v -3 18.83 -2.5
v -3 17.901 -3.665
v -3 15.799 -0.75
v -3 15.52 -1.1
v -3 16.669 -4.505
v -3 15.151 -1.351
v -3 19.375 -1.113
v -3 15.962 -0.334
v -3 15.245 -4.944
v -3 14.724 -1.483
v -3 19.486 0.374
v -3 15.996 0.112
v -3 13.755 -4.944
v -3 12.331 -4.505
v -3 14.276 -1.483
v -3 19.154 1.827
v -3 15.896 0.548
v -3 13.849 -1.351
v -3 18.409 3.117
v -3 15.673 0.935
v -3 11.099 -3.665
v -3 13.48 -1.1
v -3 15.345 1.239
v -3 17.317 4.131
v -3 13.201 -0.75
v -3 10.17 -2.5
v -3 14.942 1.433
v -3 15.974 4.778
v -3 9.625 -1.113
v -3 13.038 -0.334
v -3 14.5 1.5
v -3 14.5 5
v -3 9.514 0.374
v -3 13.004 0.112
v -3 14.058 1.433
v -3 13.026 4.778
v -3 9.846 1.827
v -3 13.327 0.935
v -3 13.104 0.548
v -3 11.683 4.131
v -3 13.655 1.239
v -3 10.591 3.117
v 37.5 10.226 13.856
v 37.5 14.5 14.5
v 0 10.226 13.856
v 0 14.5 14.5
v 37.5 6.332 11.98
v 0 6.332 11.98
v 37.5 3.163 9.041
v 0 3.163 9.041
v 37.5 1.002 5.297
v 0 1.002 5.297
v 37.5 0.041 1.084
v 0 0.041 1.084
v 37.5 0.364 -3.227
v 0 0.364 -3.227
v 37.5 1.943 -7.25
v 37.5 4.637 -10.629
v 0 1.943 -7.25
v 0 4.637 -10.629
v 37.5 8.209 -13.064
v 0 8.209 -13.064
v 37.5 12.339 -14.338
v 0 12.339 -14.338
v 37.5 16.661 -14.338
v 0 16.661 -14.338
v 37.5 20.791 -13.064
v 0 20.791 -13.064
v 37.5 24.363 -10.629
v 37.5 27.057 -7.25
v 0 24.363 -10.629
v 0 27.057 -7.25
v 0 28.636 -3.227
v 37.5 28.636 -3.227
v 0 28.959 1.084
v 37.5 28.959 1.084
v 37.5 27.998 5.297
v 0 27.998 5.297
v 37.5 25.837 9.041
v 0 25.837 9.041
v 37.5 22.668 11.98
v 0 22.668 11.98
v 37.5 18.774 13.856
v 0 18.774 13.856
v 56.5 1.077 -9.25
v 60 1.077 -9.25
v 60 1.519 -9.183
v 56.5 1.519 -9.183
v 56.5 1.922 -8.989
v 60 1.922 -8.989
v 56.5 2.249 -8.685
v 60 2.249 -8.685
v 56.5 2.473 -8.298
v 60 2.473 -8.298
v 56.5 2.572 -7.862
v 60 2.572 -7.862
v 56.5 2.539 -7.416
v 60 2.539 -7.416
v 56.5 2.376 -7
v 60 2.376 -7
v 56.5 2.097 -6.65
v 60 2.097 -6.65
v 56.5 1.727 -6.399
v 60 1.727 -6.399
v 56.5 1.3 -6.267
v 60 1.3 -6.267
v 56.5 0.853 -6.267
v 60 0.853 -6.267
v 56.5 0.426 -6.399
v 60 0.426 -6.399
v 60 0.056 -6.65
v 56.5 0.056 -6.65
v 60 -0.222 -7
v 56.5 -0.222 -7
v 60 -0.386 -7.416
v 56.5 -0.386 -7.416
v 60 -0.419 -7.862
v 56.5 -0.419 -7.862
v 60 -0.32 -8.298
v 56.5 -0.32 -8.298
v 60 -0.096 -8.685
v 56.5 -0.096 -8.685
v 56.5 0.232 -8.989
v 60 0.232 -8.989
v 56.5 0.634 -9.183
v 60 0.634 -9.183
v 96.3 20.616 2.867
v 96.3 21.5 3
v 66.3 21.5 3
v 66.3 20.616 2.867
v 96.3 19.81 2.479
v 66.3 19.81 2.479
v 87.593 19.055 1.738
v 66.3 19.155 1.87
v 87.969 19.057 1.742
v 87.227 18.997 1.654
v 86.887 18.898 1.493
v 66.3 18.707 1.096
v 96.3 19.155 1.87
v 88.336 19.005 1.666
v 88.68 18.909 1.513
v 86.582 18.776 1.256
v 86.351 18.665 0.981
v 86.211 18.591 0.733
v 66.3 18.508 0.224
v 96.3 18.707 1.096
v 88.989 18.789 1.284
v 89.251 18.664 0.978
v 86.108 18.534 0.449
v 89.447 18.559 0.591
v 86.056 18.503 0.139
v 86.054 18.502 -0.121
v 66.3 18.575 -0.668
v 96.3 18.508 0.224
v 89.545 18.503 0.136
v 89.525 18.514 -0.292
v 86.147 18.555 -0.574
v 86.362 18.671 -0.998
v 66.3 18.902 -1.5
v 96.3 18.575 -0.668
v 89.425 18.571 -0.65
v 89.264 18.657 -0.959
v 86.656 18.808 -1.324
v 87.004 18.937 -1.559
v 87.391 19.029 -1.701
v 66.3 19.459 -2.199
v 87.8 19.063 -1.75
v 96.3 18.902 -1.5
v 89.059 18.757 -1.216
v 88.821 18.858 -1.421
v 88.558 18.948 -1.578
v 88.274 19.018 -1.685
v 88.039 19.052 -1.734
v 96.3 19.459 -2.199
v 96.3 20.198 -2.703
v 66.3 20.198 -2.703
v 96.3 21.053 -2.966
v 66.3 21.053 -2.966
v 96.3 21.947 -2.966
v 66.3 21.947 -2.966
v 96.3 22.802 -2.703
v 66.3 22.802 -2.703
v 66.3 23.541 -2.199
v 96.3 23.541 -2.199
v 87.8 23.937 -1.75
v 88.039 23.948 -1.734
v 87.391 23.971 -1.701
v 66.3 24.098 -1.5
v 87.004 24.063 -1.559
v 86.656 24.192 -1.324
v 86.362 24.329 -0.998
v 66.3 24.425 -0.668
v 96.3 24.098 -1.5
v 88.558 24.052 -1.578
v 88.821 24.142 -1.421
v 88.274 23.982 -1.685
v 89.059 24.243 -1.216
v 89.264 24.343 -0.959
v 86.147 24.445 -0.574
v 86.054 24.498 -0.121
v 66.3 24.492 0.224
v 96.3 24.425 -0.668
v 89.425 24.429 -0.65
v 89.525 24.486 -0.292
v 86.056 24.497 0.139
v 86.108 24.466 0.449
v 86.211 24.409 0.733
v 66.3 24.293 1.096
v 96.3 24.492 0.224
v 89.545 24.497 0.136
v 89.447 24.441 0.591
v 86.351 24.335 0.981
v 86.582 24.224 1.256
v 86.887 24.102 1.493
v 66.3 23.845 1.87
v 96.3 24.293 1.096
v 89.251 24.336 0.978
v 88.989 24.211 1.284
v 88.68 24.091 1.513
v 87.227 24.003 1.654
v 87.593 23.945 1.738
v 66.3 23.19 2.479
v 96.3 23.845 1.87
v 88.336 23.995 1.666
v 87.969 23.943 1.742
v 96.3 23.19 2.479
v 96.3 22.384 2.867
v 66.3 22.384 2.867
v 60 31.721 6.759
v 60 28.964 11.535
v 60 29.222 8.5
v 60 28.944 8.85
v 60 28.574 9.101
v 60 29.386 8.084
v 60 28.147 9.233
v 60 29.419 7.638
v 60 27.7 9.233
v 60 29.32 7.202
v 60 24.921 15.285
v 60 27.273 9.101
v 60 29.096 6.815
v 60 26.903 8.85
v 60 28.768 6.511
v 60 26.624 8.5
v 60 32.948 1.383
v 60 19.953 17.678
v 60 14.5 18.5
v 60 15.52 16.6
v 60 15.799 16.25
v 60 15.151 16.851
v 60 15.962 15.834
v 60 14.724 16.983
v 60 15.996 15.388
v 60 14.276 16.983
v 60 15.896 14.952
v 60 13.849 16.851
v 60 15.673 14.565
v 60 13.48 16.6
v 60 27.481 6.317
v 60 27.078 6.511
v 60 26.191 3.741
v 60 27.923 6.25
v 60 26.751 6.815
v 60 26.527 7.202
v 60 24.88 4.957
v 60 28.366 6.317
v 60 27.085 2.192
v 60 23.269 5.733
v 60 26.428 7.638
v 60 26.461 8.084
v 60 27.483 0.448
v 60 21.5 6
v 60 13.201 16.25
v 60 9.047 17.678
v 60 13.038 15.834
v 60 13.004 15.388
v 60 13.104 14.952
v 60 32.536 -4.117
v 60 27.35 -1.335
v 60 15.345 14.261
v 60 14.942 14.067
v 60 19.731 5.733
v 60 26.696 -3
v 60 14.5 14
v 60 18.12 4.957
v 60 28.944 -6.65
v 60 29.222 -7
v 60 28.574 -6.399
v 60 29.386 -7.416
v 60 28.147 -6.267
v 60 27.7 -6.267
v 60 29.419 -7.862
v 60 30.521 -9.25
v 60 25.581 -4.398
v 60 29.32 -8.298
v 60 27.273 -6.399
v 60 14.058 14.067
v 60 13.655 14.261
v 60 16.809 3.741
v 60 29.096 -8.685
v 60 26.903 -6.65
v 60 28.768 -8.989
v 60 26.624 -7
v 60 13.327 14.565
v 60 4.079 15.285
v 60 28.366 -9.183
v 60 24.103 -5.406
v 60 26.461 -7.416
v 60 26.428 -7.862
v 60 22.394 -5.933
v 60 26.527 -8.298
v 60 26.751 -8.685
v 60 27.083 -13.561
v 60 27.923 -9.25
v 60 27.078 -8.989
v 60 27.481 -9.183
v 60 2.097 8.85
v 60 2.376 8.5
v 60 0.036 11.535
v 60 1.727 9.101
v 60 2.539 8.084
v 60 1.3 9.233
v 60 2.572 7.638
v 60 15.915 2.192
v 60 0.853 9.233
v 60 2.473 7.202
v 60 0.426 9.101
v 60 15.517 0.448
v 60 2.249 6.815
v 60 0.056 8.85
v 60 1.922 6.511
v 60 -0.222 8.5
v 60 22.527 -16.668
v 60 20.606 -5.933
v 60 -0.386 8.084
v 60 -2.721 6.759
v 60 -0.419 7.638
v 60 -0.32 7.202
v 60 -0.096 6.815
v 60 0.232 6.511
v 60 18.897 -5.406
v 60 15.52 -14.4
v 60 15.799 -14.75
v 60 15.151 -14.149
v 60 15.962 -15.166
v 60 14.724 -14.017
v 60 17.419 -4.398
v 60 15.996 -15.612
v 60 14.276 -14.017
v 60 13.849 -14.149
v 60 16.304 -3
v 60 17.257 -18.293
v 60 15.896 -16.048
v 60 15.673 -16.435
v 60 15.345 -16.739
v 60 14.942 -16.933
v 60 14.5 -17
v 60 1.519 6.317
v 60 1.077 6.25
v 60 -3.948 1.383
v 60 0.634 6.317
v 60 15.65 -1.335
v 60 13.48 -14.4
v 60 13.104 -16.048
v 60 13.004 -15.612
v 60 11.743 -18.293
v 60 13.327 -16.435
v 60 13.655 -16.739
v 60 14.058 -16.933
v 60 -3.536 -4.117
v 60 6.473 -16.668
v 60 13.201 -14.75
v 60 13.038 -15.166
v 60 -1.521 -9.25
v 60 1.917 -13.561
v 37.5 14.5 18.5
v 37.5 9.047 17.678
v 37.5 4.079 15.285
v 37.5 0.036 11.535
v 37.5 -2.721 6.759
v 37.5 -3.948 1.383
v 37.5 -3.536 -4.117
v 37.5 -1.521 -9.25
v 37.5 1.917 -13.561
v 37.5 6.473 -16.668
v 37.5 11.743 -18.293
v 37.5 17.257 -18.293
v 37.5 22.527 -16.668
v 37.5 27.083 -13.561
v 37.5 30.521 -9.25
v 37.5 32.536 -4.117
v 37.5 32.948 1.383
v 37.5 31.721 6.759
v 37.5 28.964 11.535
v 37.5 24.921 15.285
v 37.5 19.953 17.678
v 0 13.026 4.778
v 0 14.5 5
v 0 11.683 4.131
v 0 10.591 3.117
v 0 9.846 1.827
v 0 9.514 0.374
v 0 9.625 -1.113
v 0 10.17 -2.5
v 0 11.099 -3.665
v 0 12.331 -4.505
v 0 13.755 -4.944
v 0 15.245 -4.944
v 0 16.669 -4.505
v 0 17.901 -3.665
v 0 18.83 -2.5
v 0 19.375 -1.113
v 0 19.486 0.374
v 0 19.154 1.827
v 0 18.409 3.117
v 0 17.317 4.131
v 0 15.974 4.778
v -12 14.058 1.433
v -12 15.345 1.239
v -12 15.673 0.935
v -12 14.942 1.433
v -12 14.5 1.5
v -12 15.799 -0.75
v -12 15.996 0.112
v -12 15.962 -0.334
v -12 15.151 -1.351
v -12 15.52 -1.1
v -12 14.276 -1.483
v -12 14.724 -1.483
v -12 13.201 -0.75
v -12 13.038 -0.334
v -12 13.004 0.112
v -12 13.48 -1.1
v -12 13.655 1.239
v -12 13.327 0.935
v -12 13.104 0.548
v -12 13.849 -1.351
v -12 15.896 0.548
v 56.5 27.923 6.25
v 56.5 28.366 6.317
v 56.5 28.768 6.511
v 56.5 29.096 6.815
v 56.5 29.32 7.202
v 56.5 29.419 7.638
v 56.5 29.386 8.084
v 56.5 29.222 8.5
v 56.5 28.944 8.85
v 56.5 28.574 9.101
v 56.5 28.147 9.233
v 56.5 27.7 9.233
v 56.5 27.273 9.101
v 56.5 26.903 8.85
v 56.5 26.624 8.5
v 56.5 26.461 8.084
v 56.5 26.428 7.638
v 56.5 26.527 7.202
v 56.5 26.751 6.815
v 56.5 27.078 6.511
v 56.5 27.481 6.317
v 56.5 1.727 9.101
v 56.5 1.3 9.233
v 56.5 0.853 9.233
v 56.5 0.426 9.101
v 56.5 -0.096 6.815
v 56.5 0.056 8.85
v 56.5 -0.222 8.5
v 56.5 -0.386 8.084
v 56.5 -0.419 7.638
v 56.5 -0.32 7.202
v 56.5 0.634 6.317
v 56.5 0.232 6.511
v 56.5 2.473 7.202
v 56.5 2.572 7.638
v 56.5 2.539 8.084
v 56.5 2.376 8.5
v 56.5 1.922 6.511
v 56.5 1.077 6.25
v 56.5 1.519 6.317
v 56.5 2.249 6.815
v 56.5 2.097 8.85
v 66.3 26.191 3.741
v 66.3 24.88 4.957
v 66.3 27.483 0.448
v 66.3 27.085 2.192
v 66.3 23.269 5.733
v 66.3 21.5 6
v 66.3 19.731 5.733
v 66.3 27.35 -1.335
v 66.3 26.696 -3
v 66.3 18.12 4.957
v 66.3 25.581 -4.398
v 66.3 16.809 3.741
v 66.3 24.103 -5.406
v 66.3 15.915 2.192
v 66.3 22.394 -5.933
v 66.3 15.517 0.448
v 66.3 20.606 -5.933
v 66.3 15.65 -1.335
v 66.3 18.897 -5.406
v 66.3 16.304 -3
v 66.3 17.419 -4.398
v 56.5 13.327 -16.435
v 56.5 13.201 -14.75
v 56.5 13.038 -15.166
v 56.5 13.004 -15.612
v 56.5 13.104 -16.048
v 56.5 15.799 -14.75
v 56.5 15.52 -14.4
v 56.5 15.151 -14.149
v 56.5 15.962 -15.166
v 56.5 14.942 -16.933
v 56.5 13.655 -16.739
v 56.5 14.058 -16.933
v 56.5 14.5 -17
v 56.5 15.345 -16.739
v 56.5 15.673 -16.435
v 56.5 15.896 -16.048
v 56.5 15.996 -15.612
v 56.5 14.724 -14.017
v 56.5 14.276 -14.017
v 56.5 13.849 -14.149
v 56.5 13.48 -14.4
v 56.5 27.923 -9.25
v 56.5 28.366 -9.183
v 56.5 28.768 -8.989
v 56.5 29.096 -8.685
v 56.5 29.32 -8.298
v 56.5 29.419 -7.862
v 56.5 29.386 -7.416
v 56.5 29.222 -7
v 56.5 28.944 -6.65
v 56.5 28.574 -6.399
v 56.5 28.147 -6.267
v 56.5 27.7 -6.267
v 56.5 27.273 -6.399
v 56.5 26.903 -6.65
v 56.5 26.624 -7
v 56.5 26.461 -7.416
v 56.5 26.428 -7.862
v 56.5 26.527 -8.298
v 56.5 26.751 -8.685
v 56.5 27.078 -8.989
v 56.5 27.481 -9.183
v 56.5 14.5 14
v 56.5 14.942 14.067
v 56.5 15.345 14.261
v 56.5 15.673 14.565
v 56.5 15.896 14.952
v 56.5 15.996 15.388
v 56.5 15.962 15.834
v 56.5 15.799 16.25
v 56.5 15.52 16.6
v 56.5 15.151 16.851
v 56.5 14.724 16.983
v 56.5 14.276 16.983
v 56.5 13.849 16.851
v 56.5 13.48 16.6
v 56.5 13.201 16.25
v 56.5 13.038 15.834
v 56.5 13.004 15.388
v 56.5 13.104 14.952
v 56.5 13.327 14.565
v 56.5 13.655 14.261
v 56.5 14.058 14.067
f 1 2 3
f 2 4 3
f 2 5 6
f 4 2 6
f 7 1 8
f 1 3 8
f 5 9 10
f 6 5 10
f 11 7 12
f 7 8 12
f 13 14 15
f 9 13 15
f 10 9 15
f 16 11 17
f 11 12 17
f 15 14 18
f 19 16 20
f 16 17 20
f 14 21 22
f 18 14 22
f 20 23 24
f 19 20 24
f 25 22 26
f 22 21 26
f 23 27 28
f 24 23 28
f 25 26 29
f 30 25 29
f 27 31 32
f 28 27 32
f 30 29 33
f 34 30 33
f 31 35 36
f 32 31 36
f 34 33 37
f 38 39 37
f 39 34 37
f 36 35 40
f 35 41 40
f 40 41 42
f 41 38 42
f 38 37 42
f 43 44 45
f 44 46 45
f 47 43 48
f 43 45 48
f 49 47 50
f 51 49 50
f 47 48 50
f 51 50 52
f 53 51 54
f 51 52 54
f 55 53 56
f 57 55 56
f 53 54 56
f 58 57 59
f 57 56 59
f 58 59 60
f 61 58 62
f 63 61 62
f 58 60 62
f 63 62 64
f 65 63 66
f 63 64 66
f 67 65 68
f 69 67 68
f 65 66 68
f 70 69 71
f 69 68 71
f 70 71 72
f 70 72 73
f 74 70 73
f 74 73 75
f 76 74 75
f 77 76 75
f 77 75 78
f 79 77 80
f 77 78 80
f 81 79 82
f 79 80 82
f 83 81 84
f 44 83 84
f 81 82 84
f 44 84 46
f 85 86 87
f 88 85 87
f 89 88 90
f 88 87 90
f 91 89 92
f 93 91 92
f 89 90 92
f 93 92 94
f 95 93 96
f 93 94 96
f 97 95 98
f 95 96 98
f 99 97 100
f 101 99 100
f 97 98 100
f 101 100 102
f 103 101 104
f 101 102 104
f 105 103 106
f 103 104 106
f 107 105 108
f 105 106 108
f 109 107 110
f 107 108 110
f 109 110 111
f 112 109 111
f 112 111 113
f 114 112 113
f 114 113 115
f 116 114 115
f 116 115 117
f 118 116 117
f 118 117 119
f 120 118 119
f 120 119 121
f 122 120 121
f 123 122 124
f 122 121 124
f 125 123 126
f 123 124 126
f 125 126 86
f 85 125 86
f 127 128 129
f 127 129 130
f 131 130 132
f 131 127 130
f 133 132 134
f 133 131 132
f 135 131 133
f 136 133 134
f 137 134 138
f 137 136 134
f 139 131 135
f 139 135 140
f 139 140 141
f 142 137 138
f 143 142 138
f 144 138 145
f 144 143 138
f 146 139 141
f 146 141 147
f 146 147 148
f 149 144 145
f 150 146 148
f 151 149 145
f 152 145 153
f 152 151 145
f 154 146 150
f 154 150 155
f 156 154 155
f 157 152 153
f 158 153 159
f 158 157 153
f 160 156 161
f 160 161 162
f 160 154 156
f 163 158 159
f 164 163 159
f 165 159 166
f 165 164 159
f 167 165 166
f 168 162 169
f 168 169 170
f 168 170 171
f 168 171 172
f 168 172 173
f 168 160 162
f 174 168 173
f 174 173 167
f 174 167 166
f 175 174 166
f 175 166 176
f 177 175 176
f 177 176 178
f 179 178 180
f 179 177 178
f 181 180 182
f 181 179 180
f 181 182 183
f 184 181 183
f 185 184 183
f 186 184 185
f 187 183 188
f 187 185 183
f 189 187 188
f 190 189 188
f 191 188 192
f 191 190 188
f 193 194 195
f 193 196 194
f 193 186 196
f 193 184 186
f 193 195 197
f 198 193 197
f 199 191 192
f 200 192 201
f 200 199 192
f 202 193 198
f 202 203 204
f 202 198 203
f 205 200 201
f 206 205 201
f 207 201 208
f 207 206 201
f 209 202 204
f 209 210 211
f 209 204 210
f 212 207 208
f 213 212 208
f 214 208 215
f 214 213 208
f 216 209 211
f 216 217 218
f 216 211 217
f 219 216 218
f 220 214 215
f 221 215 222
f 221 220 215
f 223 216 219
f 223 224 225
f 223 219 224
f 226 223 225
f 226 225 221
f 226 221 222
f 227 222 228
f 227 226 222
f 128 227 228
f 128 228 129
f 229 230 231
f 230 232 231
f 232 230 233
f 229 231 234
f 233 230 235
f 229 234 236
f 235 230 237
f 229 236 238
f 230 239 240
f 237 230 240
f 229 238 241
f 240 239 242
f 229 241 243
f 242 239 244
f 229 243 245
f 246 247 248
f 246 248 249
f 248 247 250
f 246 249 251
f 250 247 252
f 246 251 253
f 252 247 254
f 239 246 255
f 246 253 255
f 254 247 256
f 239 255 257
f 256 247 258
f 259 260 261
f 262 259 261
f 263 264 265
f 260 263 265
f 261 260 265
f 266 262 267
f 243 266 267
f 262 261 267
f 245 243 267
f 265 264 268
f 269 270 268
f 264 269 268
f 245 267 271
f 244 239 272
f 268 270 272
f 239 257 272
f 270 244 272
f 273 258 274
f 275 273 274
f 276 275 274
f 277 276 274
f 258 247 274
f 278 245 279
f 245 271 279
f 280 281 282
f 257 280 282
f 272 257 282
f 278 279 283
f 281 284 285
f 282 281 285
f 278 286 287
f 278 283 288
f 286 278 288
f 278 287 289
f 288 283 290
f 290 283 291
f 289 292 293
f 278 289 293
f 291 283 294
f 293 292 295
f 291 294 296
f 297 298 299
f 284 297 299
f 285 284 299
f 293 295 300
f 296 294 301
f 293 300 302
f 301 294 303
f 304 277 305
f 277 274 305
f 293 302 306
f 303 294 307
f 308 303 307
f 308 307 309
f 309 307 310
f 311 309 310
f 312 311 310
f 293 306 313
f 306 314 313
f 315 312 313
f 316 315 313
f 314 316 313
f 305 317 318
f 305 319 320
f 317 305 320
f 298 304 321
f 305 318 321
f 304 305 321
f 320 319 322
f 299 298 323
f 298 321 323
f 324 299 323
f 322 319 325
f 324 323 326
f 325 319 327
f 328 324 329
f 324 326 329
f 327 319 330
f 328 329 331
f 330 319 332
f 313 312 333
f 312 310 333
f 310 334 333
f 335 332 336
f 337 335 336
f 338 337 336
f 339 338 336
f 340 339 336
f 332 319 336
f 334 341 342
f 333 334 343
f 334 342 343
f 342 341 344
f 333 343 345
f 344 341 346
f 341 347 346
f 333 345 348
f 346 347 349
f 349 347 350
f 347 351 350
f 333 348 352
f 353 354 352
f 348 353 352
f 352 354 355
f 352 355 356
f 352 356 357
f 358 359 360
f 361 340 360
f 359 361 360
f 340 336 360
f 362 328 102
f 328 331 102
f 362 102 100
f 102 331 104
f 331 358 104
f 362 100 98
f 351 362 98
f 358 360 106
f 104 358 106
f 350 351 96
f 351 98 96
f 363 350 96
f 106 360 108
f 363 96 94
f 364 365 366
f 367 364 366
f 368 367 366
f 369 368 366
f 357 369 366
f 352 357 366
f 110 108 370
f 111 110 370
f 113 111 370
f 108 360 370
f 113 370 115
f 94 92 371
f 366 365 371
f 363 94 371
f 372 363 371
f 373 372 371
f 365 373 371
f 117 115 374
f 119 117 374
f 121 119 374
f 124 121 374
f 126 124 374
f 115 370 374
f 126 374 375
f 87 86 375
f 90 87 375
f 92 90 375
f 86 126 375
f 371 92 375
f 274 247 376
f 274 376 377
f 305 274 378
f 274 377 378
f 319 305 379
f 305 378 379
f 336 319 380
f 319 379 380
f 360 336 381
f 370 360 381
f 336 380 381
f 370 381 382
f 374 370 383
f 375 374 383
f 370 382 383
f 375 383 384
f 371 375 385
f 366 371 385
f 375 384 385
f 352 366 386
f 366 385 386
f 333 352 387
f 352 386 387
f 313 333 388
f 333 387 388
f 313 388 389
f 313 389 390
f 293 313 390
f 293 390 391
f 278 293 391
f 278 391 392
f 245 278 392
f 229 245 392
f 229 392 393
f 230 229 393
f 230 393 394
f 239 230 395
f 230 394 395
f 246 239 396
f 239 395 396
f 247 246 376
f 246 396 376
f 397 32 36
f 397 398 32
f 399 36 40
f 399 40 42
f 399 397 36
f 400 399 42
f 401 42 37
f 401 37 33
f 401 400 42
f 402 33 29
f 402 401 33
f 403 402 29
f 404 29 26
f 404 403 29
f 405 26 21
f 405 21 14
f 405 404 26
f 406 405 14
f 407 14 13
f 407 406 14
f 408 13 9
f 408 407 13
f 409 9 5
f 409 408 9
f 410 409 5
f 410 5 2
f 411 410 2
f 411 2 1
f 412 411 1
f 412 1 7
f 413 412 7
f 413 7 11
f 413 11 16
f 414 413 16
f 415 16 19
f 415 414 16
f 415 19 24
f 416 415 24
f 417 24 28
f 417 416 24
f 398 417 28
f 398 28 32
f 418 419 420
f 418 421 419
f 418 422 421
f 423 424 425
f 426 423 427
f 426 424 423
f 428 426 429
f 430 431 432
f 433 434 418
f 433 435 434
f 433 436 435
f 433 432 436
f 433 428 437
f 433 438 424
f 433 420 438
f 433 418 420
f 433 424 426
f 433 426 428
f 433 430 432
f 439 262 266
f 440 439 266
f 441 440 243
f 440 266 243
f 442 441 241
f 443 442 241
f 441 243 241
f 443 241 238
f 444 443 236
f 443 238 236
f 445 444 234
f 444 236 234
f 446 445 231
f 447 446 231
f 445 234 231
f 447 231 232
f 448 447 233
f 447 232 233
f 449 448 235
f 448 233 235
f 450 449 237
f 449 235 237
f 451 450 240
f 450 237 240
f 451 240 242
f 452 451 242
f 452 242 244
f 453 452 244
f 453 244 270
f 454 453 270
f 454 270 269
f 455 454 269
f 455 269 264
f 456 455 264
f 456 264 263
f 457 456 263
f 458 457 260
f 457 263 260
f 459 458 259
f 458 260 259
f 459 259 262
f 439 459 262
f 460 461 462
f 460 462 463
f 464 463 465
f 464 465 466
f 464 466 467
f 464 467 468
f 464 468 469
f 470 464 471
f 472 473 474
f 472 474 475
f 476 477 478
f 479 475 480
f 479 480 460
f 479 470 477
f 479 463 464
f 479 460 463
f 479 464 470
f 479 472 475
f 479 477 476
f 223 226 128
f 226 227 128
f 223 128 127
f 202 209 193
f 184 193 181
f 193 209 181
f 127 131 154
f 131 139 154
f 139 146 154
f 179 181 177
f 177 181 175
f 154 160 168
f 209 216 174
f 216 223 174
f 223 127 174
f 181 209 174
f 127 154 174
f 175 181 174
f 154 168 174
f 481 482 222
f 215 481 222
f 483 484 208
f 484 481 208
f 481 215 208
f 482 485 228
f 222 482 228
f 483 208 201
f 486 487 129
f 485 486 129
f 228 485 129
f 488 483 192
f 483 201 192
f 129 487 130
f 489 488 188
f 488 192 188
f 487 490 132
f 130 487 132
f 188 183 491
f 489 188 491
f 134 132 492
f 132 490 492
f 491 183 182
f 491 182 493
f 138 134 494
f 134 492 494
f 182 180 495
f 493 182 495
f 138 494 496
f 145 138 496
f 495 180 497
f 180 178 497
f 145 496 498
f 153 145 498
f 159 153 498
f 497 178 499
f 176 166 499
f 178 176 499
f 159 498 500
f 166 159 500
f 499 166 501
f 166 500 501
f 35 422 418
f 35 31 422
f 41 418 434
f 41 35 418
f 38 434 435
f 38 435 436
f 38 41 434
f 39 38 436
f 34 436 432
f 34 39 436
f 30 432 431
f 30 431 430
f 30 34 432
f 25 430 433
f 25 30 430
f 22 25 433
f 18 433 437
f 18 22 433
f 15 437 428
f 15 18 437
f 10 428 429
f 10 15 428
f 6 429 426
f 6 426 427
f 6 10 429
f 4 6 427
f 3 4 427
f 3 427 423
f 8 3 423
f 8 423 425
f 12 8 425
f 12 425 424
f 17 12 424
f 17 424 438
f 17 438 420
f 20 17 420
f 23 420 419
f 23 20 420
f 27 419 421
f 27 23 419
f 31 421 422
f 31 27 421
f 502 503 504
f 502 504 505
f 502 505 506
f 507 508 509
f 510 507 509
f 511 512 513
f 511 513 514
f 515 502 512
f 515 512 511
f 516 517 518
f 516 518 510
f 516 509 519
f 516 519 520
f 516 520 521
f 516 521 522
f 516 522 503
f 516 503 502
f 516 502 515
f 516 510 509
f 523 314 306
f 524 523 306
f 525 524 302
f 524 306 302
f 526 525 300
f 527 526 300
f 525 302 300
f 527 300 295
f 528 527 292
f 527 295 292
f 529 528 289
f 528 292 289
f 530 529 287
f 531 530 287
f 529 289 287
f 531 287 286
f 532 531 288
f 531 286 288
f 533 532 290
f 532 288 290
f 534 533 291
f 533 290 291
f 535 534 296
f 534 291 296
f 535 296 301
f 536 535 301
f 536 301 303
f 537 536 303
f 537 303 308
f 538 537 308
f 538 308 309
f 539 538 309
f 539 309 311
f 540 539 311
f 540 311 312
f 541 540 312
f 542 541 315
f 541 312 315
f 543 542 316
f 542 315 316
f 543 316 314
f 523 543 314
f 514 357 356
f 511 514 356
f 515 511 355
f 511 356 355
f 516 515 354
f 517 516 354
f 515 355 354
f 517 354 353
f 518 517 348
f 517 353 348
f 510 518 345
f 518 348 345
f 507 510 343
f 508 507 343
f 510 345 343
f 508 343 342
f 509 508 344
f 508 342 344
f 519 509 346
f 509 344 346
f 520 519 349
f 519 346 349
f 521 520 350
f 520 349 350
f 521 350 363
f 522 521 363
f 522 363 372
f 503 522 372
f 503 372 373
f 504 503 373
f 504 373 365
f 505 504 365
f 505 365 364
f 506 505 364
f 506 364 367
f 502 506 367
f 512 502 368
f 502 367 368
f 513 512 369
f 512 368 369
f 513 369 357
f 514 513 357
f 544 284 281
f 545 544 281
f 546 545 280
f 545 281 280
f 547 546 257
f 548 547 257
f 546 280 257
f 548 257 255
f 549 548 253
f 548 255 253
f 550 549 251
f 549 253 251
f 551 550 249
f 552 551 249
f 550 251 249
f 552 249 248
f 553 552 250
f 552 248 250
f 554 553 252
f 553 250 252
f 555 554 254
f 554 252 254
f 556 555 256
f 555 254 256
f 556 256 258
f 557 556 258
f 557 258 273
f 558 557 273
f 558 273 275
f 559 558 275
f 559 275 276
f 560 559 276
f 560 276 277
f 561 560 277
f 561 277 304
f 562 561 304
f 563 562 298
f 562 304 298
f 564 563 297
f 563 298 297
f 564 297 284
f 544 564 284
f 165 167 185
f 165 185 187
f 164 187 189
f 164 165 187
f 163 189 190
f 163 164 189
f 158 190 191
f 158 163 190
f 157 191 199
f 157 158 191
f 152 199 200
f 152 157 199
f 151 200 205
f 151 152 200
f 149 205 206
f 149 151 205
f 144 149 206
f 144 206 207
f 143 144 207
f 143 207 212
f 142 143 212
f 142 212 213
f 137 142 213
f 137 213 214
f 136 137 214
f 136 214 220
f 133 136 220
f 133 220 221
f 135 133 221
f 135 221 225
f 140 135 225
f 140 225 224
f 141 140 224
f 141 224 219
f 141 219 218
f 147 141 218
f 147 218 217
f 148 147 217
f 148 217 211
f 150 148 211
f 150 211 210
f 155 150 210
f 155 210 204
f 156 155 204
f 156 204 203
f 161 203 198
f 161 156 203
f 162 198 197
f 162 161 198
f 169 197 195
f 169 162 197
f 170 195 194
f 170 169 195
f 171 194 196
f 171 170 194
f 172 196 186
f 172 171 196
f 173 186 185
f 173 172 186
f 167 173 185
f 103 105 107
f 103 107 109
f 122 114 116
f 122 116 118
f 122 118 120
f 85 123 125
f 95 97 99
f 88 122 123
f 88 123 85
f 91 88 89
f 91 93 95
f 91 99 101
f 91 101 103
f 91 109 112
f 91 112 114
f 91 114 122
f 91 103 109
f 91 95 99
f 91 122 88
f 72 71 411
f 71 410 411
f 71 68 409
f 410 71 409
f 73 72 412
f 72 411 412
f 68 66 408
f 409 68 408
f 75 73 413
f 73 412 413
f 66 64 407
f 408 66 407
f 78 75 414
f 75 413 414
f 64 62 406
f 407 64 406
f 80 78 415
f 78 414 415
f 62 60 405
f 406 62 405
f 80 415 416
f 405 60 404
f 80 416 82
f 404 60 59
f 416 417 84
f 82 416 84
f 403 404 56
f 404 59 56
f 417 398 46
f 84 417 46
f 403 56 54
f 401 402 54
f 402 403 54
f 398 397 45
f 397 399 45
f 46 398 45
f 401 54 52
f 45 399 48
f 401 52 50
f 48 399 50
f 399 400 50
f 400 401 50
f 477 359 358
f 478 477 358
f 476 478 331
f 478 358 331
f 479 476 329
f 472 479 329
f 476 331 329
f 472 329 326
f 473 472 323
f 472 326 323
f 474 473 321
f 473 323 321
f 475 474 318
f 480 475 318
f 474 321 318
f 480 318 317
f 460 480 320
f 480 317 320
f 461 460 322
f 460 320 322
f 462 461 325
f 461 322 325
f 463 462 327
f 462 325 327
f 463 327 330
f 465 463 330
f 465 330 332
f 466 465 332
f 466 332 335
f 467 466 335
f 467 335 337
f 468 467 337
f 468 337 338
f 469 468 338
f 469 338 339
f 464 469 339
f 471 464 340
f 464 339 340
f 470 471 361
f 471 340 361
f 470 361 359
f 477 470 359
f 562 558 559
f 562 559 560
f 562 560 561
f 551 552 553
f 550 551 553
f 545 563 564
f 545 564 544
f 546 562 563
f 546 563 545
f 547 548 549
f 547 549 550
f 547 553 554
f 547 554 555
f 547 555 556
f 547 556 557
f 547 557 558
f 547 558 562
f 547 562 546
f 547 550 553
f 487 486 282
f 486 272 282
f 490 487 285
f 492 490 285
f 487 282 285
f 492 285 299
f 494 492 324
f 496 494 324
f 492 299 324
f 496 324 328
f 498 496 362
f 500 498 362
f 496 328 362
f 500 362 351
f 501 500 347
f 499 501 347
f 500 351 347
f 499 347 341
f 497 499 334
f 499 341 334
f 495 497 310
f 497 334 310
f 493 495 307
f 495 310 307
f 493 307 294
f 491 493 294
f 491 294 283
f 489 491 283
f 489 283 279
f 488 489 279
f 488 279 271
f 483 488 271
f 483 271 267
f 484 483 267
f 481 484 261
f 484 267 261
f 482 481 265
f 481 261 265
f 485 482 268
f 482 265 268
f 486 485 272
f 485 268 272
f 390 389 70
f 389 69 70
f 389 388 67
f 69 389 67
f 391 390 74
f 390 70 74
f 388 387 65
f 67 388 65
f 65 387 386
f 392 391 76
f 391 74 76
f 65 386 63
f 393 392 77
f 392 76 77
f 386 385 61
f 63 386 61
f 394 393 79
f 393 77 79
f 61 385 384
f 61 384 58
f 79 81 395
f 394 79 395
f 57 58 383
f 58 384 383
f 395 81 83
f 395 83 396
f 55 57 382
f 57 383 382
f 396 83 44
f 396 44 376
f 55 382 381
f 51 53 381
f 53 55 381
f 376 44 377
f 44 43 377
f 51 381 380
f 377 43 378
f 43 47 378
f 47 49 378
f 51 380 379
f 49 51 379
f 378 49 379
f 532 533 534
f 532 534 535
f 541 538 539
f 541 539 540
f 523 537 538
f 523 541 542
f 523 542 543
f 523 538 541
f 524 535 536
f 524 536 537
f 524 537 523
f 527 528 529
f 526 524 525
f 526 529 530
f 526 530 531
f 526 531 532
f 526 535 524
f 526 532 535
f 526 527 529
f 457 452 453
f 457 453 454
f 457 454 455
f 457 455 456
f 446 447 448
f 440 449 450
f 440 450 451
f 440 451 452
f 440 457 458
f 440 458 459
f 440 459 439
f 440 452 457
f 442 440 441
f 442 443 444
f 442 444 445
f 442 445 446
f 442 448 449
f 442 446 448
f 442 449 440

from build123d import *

# Parameters (mm, degrees)
SKETCH2_W          = 3
SKETCH2_H          = 3.5
SKETCH2_H_2        = 1.5
SKETCH2_W_2        = 9
SKETCH2_6_W        = 30
SKETCH2_6_H        = 3
SKETCH3_R          = 1.5
CUT_EXTRUDE1_DEPTH = 3.5
SKETCH4_R          = 1.75
CUT_EXTRUDE2_DEPTH = 104.464679964


with BuildPart() as part:
    # Sketch2 → Revolve2 (revolve)
    with BuildSketch(Plane.XY, mode=Mode.PRIVATE) as revolve2_sk:
        Polygon((0, 14.5), (37.5, 14.5), (37.5, 29), (0, 29), (0, 19.5), (0, 16), align=None)
        Polygon((37.5, 29), (37.5, 14.5), (60, 14.5), (60, 15.5), (60, 21.5), (60, 27.5), (60, 33), (37.5, 33), align=None)
        with Locations((-1.5, 17.75)):
            Rectangle(SKETCH2_W, SKETCH2_H)
        with Locations((-1.5, 15.25)):
            Rectangle(SKETCH2_W, SKETCH2_H_2)
        with Locations((-7.5, 15.25)):
            Rectangle(SKETCH2_W_2, SKETCH2_H_2)
    revolve(revolve2_sk.sketch.rotate(Axis((-31.266871865, 14.5, 0), (1, 0, 0)), 90), axis=Axis((-31.266871865, 14.5, 0), (1, 0, 0)))

    # Sketch2<6> → Revolve3 (revolve)
    with BuildSketch(Plane.XY, mode=Mode.PRIVATE) as revolve3_sk:
        Polygon((60, 27.5), (60, 21.5), (66.3, 21.5), (66.3, 24.5), (66.3, 27.5), align=None)
        with Locations((81.3, 23)):
            Rectangle(SKETCH2_6_W, SKETCH2_6_H)
    revolve(revolve3_sk.sketch.rotate(Axis((60, 21.5, 0), (1, 0, 0)), 90), axis=Axis((60, 21.5, 0), (1, 0, 0)))

    # Sketch3 → Cut-Extrude1 (cut)
    with BuildSketch(Plane(origin=(60, 0, 0), x_dir=(0, 0, -1), z_dir=(1, 0, 0))):
        with Locations((-15.5, 14.5)):
            Circle(SKETCH3_R)
        with Locations((-7.75, 27.923393759)):
            Circle(SKETCH3_R)
        with Locations((7.75, 27.923393759)):
            Circle(SKETCH3_R)
        with Locations((15.5, 14.5)):
            Circle(SKETCH3_R)
        with Locations((7.75, 1.076606241)):
            Circle(SKETCH3_R)
        with Locations((-7.75, 1.076606241)):
            Circle(SKETCH3_R)
    extrude(amount=-CUT_EXTRUDE1_DEPTH, mode=Mode.SUBTRACT)

    # Sketch4 → Cut-Extrude2 (cut, through all)
    with BuildSketch(Plane(origin=(0, 0, 0), x_dir=(1, 0, 0), z_dir=(0, 1, 0))):
        with Locations(Location((87.8, 0, 0), (0, 0, 90))):
            Circle(SKETCH4_R)
    extrude(amount=CUT_EXTRUDE2_DEPTH, mode=Mode.SUBTRACT)


solid = part.part
